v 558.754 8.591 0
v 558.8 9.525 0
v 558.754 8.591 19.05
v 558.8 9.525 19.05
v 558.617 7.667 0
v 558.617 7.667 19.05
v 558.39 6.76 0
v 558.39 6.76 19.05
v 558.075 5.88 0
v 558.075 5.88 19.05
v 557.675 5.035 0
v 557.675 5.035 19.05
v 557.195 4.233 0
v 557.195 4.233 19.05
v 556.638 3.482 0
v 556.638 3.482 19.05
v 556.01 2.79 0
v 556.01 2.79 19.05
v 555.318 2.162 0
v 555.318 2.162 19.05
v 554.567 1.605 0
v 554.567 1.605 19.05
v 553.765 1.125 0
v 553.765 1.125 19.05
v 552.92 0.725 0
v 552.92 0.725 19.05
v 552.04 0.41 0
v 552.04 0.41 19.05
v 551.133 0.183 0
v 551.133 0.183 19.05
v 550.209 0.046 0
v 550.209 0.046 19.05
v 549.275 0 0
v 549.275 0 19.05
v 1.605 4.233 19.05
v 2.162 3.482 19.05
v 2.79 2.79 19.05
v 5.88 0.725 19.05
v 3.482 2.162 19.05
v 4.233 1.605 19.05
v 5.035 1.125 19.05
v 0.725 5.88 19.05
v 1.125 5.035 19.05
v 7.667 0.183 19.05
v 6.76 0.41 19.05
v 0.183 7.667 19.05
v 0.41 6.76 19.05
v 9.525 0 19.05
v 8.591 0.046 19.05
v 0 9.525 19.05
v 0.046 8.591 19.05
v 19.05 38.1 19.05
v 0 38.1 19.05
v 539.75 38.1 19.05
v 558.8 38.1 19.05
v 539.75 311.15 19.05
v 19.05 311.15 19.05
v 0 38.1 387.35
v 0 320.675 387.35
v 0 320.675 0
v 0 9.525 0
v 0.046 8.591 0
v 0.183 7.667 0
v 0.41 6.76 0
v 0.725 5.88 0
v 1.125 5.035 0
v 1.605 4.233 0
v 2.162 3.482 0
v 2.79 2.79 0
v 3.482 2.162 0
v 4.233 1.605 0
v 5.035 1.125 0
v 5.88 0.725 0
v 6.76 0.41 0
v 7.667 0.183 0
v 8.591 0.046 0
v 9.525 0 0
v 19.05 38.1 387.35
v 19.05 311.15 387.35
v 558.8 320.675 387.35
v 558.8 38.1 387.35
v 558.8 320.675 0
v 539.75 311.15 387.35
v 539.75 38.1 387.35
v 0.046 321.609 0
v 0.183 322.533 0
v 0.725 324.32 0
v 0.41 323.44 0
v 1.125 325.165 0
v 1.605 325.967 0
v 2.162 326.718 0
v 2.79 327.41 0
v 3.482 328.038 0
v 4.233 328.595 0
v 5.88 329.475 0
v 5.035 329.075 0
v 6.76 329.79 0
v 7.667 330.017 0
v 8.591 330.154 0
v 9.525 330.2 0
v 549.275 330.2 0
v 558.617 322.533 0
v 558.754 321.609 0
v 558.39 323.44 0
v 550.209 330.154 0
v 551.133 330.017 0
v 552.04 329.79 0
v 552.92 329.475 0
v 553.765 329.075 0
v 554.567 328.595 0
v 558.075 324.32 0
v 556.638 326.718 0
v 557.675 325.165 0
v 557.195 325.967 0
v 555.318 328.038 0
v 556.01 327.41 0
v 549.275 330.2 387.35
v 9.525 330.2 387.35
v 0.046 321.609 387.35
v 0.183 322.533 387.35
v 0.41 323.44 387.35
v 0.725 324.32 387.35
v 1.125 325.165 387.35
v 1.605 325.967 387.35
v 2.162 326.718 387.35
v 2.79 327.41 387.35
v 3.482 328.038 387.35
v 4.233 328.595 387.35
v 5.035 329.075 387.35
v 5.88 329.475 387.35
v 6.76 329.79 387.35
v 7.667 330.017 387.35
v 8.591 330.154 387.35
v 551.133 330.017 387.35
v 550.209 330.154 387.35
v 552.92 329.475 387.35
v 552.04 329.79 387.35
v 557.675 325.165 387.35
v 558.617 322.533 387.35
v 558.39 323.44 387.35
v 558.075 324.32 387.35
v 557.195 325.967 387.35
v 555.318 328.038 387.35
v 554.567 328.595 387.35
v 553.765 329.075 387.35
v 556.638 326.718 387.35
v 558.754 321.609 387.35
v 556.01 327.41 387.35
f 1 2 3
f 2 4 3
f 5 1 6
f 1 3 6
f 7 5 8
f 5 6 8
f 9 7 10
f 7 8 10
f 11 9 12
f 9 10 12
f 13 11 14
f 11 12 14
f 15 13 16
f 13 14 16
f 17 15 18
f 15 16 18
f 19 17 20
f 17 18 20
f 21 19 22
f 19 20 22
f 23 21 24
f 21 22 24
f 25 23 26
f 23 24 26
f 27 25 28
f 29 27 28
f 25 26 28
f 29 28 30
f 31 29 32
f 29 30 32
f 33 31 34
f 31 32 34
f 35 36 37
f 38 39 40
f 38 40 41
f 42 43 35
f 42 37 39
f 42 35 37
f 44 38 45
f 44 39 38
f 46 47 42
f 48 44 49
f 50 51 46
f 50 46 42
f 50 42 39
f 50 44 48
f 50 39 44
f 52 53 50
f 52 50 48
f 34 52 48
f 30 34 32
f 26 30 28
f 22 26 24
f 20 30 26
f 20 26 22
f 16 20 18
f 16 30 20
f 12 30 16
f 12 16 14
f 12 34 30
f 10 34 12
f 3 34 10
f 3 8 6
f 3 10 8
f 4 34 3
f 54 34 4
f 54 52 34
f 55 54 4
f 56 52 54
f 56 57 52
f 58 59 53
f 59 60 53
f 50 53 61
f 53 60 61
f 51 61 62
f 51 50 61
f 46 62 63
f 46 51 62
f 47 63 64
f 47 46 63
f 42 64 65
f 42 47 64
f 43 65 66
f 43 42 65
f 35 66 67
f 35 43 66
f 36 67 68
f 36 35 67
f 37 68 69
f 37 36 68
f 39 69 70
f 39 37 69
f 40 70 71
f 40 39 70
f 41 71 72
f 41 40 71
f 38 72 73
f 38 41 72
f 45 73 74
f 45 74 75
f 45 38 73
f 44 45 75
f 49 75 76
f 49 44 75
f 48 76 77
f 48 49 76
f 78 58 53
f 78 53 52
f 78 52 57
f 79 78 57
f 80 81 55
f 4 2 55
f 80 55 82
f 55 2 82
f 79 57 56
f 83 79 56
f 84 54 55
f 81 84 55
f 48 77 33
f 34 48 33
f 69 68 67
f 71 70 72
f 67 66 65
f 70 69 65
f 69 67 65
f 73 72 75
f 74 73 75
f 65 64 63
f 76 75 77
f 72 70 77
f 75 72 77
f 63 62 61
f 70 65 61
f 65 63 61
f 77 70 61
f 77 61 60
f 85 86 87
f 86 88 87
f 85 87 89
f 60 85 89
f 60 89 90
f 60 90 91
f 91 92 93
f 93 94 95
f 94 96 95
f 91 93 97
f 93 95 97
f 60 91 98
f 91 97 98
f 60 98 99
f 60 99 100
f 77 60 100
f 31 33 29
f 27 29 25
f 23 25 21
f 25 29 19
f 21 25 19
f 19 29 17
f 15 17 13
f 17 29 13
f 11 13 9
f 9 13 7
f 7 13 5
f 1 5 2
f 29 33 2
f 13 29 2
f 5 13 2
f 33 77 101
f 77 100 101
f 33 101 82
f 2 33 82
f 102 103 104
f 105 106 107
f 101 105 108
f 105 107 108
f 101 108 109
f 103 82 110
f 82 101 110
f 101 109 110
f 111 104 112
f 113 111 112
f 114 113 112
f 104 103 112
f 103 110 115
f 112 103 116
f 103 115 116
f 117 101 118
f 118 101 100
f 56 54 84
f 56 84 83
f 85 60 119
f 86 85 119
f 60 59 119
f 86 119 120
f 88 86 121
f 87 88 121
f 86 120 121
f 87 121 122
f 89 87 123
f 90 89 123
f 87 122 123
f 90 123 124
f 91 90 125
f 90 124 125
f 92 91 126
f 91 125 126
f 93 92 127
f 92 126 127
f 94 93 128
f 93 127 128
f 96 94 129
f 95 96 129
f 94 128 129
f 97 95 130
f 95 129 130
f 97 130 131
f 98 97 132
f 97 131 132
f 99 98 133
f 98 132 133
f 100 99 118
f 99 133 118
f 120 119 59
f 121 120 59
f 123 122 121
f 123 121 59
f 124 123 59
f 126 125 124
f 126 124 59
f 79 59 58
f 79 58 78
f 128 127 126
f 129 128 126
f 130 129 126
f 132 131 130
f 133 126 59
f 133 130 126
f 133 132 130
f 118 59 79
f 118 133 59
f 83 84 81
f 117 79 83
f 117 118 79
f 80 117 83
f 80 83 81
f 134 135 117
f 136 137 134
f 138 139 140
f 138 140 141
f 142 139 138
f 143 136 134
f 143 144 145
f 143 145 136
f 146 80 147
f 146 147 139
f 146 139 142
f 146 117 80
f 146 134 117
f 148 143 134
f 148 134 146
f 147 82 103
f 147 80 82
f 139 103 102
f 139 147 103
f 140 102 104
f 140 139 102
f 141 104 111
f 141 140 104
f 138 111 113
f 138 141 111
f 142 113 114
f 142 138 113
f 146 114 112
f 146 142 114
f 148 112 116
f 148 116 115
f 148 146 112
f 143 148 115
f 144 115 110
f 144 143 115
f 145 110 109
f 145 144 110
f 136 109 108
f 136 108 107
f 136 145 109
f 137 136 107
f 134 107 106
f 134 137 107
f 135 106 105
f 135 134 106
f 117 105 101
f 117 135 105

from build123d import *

# Parameters (mm, degrees)
F1_DEPTH = 19.05
F0_W     = 19.05
F0_H     = 273.05
F2_DEPTH = 387.35
F3_R     = 9.525


with BuildPart() as f1:
    # F0 (on Top) → F1 (new body)
    with BuildSketch(Plane.XY):
        Polygon((0, 38.1), (0, 0), (558.8, 0), (558.8, 38.1), (539.75, 38.1), (539.75, 311.15), (19.05, 311.15), (19.05, 38.1), align=None)
    extrude(amount=F1_DEPTH)

    # F0 (on Top) → F2 (join)
    with BuildSketch(Plane.XY):
        Polygon((0, 330.2), (0, 311.15), (19.05, 311.15), (539.75, 311.15), (558.8, 311.15), (558.8, 330.2), align=None)
        with Locations((9.525, 174.625)):
            Rectangle(F0_W, F0_H)
        with Locations((549.275, 174.625)):
            Rectangle(F0_W, F0_H)
    extrude(amount=F2_DEPTH)

    # F3
    f3_edges = [f1.edges().sort_by_distance(p)[0] for p in [
        (0, 330.2, 193.675),
        (558.8, 330.2, 193.675),
        (558.8, 0, 9.525),
        (0, 0, 9.525),
    ]]
    fillet(f3_edges, radius=F3_R)


solid = f1.part
